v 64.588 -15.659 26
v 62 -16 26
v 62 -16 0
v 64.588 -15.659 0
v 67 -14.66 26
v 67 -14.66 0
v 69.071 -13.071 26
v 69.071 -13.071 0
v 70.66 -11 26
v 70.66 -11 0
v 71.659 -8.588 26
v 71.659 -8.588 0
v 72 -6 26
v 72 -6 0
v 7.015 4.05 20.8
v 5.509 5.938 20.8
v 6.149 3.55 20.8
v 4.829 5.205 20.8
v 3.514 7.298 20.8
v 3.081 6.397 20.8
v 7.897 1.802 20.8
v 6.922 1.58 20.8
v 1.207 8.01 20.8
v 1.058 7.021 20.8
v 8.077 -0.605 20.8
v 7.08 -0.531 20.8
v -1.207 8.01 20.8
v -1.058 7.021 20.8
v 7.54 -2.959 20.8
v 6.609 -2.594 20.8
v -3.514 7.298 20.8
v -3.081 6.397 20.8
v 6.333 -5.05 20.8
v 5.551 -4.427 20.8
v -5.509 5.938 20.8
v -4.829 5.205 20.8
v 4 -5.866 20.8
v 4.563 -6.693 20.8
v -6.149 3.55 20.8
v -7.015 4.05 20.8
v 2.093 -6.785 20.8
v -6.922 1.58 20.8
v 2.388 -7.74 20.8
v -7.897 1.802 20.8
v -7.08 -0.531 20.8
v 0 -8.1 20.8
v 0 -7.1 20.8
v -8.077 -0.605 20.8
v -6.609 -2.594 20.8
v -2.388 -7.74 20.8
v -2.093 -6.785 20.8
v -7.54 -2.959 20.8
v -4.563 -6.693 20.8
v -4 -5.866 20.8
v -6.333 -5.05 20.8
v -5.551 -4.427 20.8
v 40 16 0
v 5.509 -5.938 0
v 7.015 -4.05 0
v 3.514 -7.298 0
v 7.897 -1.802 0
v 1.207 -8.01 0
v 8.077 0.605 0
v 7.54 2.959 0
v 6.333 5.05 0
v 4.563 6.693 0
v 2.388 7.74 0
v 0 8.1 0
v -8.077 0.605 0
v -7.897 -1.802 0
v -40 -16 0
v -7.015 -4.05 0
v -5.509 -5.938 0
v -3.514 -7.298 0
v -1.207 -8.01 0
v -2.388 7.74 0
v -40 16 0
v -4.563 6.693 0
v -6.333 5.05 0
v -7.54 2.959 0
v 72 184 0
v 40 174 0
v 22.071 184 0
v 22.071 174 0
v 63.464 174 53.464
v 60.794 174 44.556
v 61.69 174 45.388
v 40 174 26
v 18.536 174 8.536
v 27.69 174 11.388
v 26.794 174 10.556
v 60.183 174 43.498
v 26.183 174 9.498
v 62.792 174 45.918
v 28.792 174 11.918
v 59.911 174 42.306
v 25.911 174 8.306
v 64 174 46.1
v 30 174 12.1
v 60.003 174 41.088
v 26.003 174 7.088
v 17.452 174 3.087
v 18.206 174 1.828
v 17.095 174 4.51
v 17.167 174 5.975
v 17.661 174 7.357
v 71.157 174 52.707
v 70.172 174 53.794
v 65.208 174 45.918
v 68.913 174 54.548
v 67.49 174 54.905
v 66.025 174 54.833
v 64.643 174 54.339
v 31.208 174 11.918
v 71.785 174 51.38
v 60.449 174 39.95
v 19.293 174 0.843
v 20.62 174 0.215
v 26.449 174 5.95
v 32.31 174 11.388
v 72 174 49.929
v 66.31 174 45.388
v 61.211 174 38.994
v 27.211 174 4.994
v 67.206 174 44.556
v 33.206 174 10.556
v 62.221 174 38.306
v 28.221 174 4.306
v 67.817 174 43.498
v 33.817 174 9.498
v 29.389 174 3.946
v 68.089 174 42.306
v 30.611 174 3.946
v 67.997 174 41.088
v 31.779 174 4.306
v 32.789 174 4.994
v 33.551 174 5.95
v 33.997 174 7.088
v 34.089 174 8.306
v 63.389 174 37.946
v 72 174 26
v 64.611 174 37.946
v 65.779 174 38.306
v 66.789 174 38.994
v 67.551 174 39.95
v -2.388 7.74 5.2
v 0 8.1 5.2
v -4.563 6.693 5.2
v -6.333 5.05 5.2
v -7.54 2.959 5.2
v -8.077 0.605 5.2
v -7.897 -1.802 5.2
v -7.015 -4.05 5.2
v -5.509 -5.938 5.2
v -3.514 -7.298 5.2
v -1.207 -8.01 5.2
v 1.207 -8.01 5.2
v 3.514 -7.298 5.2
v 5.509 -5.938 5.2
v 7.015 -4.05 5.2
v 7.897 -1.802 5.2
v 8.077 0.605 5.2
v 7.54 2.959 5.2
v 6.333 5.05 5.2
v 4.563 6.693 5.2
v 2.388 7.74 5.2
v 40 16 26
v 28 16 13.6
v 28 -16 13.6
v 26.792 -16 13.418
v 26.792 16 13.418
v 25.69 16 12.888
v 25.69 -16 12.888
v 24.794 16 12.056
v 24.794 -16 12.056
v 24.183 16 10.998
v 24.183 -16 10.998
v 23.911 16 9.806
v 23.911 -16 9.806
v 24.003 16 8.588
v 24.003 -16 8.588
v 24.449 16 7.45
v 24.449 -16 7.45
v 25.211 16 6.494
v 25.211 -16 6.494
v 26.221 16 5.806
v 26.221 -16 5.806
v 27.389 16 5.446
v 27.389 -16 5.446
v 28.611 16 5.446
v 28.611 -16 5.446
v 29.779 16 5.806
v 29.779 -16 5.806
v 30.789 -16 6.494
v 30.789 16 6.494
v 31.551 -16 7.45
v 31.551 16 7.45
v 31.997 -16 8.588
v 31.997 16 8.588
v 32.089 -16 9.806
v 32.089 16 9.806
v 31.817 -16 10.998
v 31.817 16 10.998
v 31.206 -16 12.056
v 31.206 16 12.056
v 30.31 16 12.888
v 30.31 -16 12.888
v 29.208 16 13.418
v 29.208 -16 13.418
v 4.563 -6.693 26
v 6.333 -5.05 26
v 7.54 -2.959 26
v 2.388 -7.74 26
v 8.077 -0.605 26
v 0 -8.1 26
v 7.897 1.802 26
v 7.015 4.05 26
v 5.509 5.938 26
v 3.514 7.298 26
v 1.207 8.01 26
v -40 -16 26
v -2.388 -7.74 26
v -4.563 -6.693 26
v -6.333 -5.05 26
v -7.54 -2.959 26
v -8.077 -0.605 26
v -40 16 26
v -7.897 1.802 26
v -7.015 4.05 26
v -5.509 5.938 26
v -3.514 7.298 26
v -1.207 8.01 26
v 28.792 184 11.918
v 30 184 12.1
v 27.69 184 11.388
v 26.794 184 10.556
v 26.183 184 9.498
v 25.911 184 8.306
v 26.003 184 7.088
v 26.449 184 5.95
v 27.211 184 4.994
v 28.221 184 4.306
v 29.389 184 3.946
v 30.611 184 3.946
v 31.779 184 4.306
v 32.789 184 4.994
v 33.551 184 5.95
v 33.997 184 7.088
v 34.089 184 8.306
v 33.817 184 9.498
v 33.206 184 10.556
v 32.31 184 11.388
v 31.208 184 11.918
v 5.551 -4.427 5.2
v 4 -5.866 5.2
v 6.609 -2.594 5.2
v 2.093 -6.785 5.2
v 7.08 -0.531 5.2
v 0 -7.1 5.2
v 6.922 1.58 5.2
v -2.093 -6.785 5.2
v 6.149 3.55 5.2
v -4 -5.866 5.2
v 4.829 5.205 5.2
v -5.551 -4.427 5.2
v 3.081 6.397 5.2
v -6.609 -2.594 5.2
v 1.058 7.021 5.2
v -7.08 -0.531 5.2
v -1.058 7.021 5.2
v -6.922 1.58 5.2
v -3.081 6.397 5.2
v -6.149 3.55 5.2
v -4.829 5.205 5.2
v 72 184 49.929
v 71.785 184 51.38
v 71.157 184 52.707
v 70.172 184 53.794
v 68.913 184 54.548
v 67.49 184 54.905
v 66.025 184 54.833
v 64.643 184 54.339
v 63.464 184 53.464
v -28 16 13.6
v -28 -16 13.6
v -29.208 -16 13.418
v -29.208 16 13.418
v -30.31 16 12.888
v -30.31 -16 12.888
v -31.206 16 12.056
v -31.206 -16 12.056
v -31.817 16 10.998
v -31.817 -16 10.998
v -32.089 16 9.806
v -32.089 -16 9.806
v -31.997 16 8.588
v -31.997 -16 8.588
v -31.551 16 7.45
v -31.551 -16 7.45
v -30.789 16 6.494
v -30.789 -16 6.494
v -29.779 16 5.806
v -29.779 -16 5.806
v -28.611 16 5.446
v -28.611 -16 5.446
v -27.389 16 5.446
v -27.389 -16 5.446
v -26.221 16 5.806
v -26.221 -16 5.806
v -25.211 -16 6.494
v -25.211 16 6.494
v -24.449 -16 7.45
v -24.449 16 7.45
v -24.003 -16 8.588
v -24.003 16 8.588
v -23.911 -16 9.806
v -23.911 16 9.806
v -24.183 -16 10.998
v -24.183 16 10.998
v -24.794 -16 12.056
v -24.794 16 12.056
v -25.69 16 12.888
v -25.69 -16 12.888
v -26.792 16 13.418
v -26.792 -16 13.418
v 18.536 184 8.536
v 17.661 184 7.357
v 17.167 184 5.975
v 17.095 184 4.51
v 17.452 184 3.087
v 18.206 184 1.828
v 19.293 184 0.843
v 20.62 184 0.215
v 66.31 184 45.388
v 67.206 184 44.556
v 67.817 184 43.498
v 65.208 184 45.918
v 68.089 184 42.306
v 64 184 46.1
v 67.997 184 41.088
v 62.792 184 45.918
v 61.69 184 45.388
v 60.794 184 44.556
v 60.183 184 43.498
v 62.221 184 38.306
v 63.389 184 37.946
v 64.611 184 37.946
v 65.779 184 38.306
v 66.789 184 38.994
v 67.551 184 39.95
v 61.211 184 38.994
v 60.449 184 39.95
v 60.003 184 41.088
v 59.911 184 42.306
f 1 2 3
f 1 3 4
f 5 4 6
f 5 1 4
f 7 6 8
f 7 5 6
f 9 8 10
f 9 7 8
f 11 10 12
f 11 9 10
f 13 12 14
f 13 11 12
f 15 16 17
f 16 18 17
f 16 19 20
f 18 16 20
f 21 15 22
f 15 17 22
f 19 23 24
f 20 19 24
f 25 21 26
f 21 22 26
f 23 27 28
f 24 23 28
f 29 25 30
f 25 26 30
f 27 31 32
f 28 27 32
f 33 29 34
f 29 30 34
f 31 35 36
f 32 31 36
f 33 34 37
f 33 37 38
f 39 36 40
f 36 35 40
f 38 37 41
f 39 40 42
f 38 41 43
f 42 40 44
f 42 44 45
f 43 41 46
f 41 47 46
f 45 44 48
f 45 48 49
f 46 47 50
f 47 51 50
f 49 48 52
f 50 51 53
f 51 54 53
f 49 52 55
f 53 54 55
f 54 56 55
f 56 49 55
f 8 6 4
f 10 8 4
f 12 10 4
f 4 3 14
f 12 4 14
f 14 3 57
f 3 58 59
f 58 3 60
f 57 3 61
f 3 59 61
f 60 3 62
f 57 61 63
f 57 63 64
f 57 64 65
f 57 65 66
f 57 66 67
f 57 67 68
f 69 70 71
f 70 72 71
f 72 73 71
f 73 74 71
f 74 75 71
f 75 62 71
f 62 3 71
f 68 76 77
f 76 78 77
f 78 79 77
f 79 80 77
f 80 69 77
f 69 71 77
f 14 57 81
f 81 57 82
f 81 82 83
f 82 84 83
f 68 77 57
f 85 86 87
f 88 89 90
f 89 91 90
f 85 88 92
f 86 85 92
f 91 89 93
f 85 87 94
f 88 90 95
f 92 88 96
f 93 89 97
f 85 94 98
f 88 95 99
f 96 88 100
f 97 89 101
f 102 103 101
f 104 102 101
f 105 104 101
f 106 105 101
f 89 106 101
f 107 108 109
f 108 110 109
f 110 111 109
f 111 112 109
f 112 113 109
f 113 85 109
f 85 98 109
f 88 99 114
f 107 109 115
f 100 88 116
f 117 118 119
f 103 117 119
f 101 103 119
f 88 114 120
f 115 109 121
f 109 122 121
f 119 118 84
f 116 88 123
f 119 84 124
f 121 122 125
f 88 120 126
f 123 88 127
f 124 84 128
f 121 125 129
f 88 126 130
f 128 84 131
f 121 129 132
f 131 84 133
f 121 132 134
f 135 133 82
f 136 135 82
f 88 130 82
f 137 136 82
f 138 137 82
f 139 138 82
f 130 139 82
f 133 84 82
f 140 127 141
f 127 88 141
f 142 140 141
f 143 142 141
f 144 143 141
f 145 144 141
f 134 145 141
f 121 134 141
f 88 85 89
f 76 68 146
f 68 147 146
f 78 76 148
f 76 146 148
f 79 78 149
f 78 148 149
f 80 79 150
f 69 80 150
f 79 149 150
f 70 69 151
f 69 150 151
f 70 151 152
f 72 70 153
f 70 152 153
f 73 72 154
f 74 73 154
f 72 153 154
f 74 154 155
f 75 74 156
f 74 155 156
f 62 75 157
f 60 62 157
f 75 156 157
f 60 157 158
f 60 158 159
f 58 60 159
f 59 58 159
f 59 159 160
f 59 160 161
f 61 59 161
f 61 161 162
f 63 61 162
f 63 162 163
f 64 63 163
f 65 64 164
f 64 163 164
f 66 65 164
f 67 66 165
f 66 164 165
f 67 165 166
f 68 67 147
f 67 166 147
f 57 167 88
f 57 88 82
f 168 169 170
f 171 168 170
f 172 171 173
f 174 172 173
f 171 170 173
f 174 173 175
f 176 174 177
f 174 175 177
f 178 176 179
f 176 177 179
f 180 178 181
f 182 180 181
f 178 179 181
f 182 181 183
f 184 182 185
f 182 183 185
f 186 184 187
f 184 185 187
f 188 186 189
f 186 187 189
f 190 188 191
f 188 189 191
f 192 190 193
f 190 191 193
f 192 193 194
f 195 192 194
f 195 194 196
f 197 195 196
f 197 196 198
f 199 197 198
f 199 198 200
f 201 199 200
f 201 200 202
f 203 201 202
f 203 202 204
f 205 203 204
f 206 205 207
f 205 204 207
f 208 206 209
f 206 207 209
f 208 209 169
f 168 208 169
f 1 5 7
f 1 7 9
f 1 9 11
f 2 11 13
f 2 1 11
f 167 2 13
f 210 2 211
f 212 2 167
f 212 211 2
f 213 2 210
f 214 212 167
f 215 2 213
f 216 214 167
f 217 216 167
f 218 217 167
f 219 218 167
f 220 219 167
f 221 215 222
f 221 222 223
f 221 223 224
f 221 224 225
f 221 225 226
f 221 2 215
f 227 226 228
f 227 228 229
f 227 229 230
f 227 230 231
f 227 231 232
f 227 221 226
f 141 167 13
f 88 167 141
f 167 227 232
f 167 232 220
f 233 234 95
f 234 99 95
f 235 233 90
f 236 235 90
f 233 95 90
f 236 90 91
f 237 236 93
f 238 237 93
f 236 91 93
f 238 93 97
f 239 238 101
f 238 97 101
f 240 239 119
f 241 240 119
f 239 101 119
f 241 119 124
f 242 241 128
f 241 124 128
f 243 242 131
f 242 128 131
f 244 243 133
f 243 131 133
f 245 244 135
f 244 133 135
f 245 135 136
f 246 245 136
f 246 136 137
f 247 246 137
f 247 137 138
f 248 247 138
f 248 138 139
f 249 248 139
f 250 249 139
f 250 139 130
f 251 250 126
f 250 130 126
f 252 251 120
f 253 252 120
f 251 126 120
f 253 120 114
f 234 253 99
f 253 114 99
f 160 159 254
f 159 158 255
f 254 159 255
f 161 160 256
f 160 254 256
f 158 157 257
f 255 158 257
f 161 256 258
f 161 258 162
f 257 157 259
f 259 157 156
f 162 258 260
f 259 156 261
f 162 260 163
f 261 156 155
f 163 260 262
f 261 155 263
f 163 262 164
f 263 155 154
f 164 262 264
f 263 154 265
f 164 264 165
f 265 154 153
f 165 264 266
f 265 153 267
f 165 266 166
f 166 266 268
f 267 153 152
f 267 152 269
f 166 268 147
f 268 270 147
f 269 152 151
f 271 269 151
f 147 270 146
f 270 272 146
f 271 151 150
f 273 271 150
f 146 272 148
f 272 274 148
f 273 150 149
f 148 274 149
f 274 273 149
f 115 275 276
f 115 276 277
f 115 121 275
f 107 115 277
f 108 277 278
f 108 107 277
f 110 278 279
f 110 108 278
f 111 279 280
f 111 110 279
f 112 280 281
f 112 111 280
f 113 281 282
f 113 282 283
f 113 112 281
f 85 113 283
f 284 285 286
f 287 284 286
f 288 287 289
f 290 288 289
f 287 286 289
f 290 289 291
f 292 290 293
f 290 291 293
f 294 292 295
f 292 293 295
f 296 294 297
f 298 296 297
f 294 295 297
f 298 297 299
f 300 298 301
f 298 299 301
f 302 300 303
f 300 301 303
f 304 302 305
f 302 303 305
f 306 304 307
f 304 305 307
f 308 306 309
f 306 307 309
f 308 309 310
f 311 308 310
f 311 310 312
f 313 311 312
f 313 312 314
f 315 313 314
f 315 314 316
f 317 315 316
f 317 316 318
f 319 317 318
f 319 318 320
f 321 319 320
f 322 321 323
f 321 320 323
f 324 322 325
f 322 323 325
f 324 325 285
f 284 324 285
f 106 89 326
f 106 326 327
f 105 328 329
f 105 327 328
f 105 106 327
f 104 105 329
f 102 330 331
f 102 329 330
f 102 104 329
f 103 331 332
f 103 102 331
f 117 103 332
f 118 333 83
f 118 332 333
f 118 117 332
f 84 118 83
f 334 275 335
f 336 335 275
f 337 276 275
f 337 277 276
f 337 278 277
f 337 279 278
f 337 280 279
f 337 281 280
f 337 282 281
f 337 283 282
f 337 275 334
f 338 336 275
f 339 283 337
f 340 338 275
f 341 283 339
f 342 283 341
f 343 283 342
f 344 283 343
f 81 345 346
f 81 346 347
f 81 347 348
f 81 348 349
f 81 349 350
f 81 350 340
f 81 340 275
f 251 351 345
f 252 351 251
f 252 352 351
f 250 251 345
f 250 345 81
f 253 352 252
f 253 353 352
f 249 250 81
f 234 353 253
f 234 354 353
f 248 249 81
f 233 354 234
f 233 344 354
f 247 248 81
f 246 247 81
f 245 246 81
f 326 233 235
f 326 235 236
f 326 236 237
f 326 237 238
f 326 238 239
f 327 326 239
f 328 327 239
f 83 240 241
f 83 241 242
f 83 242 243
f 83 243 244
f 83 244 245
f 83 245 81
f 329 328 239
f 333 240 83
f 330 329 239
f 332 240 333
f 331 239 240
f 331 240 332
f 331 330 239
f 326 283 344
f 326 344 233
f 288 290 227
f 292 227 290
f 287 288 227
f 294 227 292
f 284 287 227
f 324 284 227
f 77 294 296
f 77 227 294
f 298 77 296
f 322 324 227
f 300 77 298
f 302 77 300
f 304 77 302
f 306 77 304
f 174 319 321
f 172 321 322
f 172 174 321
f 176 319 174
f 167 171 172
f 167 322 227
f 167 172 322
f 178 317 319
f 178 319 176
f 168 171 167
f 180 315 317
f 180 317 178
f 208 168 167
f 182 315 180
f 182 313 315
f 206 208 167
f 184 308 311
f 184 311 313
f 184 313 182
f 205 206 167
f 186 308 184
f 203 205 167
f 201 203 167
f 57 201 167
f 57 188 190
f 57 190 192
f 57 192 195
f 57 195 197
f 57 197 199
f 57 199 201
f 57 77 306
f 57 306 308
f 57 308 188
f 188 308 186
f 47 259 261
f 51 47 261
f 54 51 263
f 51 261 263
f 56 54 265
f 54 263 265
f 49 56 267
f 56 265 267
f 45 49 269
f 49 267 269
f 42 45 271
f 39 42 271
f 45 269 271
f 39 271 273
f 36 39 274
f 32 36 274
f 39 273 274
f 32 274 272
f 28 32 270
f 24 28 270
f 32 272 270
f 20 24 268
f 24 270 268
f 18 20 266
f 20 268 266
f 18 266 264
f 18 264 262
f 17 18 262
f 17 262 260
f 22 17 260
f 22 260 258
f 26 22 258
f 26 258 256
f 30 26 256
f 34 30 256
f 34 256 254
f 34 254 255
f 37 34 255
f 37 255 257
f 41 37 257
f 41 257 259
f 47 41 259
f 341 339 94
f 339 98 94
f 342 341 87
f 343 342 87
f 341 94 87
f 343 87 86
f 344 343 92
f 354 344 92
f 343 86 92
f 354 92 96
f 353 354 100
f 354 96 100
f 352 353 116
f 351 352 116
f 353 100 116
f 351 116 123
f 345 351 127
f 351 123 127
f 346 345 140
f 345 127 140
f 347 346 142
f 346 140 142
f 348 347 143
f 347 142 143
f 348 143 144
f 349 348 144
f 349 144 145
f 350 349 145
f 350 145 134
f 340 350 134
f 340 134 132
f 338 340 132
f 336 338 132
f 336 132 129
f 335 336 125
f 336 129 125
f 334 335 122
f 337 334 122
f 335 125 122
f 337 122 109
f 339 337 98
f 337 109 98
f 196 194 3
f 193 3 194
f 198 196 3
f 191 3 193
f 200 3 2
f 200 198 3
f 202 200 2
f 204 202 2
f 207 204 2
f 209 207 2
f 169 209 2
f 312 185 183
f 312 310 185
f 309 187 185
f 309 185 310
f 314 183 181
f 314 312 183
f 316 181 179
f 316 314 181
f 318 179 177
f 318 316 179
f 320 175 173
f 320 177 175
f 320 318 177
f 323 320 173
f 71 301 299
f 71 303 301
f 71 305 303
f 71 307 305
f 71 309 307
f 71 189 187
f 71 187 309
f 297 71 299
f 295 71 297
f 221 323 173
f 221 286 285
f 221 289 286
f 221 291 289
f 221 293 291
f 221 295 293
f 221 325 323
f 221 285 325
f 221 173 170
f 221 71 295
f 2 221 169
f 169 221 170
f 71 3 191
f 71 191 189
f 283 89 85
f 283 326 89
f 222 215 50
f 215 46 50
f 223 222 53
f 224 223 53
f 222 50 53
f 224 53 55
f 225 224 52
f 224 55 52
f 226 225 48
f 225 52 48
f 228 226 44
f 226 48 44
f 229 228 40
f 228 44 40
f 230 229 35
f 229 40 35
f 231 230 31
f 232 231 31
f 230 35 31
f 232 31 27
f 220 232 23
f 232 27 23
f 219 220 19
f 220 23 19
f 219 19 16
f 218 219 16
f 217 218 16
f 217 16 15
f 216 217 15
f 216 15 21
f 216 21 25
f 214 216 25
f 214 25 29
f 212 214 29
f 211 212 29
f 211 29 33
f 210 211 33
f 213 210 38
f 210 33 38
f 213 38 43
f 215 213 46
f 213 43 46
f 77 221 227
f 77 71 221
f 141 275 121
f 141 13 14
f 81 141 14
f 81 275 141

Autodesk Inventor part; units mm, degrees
ref_plane "YZ Plane" through (0, 0, 0) normal (1, 0, 0) x (0, 1, 0)
ref_plane "XZ Plane" through (0, 0, 0) normal (0, 1, 0) x (-1, 0, 0)
ref_plane "XY Plane" through (0, 0, 0) normal (0, 0, 1) x (1, 0, 0)
sketch "Sketch2" plane through (0, 0, 0) normal (0, 0, 1) x (1, 0, 0)
  line L0 (-40, 16) -> (40, 16)
  line L1 (40, 16) -> (40, -16)
  line L2 (40, -16) -> (-40, -16)
  line L3 (-40, -16) -> (-40, 16)
  line L4 (-40, 16) -> (40, -16) construction
  line L5 (40, 16) -> (-40, -16) construction
  point P0 (0, 0)
  dimension "d4" = 32
  dimension "d5" = 80
extrude "Extrusion1" add sketch "Sketch2" along normal blind 26
sketch "Sketch6" plane through (-40, 16, 0) normal (0, 1, 0) x (1, 0, 0)
  line L0 (12, -9.5) -> (0, -9.5) construction
  line L1 (0, 0) -> (0, -26) projected
  line L2 (68, -9.5) -> (80, -9.5) construction
  line L3 (80, 0) -> (80, -26) projected
  line L4 (80, 0) -> (0, 0) projected
  point P0 (40, 0)
  point P1 (74, -9.5)
  dimension "d29" = 56
  dimension "d30" = 9.5
hole "Hole3" at (-28, 16, 9.5) at (28, 16, 9.5) direction (0, -1, 0) diameter 8.2 end through all
sketch "Sketch7" plane through (0, 0, 26) normal (0, 0, 1) x (1, 0, 0)
  point P0 (0, 0)
  point P1 (0, 0)
hole "Hole4" at (0, 0, 26) direction (0, 0, -1) diameter 14.2 end through all counterbore diameter 16.2 counterbore depth 5.2
sketch "Sketch8" plane through (0, 0, 0) normal (0, 0, -1) x (-1, 0, 0)
  point P0 (0, 0)
  point P1 (0, 0)
hole "Hole5" at (0, 0, 0) direction (0, 0, 1) diameter 14.2 end through all counterbore diameter 16.2 counterbore depth 5.2
sketch "Sketch9" plane through (-40, 16, 0) normal (0, 1, 0) x (1, 0, 0)
  line L0 (0, 0) -> (0, -26) projected
  line L1 (80, -26) -> (0, -26) projected
  line L2 (0, 0) -> (80, -26)
  point P0 (40, 0)
sketch "Sketch10" plane through (-40, 16, 0) normal (0, 1, 0) x (1, 0, 0)
  point P0 (40, 0)
sketch "Sketch11" plane through (40, -16, 0) normal (1, 0, 0) x (0, 0, -1)
  line L0 (0, 0) -> (0, 32) projected
  line L1 (0, 0) -> (-26, 0)
  line L2 (-26, 0) -> (-26, 200)
  line L3 (-26, 200) -> (0, 200)
  line L4 (0, 200) -> (0, 0)
  line L5 (-26, 0) -> (-26, 32) projected
  point P0 (0, 16)
  dimension "d52" = 200
extrude "Extrusion4" add sketch "Sketch11" along normal blind 32
fillet "Fillet1" radius 10 1 edges at (72, -16, 13)
sketch "Sketch13" plane through (40, 184, 26) normal (0, 1, 0) x (1, 0, 0)
  line L0 (32, 26) -> (-30, 26)
  line L1 (0, 26) -> (-80, 26) projected
  line L2 (32, 26) -> (32, 0) projected
  line L3 (32, 26) -> (32, -36)
  line L4 (-30, 26) -> (32, -36)
  point P0 (-40, 26)
  dimension "d58" = 62
extrude "Extrusion5" add sketch "Sketch13" against normal blind 10
fillet "Fillet2" radius 5 1 edges at (10, 179, 0)
fillet "Fillet3" radius 5 1 edges at (72, 179, 62)
sketch "Sketch15" plane through (22.0711, 184, 0) normal (0, 1, 0) x (1, 0, 0)
  line L0 (0, 0) -> (49.9289, 0) projected
  line L1 (49.9289, 0) -> (49.9289, -26) projected
  line L2 (49.9289, 0) -> (17.9289, 0)
  line L3 (17.9289, 0) -> (17.9289, -32)
  line L4 (17.9289, -32) -> (49.9289, -32)
  line L5 (49.9289, -32) -> (49.9289, 0)
  line L6 (49.9289, 0) -> (49.9289, -49.9289) projected
  point P0 (-22.0711, 0)
  point P1 (41.9289, -42)
  point P2 (7.9289, -8)
  dimension "d63" = 8
  dimension "d64" = 32
  dimension "d65" = 32
  dimension "d66" = 10
  dimension "d67" = 10
  dimension "d68" = 8
hole "Hole6" at (30, 184, 8) at (64, 184, 42) direction (0, -1, 0) diameter 8.2 depth 20
properties part number "13042026-07"
